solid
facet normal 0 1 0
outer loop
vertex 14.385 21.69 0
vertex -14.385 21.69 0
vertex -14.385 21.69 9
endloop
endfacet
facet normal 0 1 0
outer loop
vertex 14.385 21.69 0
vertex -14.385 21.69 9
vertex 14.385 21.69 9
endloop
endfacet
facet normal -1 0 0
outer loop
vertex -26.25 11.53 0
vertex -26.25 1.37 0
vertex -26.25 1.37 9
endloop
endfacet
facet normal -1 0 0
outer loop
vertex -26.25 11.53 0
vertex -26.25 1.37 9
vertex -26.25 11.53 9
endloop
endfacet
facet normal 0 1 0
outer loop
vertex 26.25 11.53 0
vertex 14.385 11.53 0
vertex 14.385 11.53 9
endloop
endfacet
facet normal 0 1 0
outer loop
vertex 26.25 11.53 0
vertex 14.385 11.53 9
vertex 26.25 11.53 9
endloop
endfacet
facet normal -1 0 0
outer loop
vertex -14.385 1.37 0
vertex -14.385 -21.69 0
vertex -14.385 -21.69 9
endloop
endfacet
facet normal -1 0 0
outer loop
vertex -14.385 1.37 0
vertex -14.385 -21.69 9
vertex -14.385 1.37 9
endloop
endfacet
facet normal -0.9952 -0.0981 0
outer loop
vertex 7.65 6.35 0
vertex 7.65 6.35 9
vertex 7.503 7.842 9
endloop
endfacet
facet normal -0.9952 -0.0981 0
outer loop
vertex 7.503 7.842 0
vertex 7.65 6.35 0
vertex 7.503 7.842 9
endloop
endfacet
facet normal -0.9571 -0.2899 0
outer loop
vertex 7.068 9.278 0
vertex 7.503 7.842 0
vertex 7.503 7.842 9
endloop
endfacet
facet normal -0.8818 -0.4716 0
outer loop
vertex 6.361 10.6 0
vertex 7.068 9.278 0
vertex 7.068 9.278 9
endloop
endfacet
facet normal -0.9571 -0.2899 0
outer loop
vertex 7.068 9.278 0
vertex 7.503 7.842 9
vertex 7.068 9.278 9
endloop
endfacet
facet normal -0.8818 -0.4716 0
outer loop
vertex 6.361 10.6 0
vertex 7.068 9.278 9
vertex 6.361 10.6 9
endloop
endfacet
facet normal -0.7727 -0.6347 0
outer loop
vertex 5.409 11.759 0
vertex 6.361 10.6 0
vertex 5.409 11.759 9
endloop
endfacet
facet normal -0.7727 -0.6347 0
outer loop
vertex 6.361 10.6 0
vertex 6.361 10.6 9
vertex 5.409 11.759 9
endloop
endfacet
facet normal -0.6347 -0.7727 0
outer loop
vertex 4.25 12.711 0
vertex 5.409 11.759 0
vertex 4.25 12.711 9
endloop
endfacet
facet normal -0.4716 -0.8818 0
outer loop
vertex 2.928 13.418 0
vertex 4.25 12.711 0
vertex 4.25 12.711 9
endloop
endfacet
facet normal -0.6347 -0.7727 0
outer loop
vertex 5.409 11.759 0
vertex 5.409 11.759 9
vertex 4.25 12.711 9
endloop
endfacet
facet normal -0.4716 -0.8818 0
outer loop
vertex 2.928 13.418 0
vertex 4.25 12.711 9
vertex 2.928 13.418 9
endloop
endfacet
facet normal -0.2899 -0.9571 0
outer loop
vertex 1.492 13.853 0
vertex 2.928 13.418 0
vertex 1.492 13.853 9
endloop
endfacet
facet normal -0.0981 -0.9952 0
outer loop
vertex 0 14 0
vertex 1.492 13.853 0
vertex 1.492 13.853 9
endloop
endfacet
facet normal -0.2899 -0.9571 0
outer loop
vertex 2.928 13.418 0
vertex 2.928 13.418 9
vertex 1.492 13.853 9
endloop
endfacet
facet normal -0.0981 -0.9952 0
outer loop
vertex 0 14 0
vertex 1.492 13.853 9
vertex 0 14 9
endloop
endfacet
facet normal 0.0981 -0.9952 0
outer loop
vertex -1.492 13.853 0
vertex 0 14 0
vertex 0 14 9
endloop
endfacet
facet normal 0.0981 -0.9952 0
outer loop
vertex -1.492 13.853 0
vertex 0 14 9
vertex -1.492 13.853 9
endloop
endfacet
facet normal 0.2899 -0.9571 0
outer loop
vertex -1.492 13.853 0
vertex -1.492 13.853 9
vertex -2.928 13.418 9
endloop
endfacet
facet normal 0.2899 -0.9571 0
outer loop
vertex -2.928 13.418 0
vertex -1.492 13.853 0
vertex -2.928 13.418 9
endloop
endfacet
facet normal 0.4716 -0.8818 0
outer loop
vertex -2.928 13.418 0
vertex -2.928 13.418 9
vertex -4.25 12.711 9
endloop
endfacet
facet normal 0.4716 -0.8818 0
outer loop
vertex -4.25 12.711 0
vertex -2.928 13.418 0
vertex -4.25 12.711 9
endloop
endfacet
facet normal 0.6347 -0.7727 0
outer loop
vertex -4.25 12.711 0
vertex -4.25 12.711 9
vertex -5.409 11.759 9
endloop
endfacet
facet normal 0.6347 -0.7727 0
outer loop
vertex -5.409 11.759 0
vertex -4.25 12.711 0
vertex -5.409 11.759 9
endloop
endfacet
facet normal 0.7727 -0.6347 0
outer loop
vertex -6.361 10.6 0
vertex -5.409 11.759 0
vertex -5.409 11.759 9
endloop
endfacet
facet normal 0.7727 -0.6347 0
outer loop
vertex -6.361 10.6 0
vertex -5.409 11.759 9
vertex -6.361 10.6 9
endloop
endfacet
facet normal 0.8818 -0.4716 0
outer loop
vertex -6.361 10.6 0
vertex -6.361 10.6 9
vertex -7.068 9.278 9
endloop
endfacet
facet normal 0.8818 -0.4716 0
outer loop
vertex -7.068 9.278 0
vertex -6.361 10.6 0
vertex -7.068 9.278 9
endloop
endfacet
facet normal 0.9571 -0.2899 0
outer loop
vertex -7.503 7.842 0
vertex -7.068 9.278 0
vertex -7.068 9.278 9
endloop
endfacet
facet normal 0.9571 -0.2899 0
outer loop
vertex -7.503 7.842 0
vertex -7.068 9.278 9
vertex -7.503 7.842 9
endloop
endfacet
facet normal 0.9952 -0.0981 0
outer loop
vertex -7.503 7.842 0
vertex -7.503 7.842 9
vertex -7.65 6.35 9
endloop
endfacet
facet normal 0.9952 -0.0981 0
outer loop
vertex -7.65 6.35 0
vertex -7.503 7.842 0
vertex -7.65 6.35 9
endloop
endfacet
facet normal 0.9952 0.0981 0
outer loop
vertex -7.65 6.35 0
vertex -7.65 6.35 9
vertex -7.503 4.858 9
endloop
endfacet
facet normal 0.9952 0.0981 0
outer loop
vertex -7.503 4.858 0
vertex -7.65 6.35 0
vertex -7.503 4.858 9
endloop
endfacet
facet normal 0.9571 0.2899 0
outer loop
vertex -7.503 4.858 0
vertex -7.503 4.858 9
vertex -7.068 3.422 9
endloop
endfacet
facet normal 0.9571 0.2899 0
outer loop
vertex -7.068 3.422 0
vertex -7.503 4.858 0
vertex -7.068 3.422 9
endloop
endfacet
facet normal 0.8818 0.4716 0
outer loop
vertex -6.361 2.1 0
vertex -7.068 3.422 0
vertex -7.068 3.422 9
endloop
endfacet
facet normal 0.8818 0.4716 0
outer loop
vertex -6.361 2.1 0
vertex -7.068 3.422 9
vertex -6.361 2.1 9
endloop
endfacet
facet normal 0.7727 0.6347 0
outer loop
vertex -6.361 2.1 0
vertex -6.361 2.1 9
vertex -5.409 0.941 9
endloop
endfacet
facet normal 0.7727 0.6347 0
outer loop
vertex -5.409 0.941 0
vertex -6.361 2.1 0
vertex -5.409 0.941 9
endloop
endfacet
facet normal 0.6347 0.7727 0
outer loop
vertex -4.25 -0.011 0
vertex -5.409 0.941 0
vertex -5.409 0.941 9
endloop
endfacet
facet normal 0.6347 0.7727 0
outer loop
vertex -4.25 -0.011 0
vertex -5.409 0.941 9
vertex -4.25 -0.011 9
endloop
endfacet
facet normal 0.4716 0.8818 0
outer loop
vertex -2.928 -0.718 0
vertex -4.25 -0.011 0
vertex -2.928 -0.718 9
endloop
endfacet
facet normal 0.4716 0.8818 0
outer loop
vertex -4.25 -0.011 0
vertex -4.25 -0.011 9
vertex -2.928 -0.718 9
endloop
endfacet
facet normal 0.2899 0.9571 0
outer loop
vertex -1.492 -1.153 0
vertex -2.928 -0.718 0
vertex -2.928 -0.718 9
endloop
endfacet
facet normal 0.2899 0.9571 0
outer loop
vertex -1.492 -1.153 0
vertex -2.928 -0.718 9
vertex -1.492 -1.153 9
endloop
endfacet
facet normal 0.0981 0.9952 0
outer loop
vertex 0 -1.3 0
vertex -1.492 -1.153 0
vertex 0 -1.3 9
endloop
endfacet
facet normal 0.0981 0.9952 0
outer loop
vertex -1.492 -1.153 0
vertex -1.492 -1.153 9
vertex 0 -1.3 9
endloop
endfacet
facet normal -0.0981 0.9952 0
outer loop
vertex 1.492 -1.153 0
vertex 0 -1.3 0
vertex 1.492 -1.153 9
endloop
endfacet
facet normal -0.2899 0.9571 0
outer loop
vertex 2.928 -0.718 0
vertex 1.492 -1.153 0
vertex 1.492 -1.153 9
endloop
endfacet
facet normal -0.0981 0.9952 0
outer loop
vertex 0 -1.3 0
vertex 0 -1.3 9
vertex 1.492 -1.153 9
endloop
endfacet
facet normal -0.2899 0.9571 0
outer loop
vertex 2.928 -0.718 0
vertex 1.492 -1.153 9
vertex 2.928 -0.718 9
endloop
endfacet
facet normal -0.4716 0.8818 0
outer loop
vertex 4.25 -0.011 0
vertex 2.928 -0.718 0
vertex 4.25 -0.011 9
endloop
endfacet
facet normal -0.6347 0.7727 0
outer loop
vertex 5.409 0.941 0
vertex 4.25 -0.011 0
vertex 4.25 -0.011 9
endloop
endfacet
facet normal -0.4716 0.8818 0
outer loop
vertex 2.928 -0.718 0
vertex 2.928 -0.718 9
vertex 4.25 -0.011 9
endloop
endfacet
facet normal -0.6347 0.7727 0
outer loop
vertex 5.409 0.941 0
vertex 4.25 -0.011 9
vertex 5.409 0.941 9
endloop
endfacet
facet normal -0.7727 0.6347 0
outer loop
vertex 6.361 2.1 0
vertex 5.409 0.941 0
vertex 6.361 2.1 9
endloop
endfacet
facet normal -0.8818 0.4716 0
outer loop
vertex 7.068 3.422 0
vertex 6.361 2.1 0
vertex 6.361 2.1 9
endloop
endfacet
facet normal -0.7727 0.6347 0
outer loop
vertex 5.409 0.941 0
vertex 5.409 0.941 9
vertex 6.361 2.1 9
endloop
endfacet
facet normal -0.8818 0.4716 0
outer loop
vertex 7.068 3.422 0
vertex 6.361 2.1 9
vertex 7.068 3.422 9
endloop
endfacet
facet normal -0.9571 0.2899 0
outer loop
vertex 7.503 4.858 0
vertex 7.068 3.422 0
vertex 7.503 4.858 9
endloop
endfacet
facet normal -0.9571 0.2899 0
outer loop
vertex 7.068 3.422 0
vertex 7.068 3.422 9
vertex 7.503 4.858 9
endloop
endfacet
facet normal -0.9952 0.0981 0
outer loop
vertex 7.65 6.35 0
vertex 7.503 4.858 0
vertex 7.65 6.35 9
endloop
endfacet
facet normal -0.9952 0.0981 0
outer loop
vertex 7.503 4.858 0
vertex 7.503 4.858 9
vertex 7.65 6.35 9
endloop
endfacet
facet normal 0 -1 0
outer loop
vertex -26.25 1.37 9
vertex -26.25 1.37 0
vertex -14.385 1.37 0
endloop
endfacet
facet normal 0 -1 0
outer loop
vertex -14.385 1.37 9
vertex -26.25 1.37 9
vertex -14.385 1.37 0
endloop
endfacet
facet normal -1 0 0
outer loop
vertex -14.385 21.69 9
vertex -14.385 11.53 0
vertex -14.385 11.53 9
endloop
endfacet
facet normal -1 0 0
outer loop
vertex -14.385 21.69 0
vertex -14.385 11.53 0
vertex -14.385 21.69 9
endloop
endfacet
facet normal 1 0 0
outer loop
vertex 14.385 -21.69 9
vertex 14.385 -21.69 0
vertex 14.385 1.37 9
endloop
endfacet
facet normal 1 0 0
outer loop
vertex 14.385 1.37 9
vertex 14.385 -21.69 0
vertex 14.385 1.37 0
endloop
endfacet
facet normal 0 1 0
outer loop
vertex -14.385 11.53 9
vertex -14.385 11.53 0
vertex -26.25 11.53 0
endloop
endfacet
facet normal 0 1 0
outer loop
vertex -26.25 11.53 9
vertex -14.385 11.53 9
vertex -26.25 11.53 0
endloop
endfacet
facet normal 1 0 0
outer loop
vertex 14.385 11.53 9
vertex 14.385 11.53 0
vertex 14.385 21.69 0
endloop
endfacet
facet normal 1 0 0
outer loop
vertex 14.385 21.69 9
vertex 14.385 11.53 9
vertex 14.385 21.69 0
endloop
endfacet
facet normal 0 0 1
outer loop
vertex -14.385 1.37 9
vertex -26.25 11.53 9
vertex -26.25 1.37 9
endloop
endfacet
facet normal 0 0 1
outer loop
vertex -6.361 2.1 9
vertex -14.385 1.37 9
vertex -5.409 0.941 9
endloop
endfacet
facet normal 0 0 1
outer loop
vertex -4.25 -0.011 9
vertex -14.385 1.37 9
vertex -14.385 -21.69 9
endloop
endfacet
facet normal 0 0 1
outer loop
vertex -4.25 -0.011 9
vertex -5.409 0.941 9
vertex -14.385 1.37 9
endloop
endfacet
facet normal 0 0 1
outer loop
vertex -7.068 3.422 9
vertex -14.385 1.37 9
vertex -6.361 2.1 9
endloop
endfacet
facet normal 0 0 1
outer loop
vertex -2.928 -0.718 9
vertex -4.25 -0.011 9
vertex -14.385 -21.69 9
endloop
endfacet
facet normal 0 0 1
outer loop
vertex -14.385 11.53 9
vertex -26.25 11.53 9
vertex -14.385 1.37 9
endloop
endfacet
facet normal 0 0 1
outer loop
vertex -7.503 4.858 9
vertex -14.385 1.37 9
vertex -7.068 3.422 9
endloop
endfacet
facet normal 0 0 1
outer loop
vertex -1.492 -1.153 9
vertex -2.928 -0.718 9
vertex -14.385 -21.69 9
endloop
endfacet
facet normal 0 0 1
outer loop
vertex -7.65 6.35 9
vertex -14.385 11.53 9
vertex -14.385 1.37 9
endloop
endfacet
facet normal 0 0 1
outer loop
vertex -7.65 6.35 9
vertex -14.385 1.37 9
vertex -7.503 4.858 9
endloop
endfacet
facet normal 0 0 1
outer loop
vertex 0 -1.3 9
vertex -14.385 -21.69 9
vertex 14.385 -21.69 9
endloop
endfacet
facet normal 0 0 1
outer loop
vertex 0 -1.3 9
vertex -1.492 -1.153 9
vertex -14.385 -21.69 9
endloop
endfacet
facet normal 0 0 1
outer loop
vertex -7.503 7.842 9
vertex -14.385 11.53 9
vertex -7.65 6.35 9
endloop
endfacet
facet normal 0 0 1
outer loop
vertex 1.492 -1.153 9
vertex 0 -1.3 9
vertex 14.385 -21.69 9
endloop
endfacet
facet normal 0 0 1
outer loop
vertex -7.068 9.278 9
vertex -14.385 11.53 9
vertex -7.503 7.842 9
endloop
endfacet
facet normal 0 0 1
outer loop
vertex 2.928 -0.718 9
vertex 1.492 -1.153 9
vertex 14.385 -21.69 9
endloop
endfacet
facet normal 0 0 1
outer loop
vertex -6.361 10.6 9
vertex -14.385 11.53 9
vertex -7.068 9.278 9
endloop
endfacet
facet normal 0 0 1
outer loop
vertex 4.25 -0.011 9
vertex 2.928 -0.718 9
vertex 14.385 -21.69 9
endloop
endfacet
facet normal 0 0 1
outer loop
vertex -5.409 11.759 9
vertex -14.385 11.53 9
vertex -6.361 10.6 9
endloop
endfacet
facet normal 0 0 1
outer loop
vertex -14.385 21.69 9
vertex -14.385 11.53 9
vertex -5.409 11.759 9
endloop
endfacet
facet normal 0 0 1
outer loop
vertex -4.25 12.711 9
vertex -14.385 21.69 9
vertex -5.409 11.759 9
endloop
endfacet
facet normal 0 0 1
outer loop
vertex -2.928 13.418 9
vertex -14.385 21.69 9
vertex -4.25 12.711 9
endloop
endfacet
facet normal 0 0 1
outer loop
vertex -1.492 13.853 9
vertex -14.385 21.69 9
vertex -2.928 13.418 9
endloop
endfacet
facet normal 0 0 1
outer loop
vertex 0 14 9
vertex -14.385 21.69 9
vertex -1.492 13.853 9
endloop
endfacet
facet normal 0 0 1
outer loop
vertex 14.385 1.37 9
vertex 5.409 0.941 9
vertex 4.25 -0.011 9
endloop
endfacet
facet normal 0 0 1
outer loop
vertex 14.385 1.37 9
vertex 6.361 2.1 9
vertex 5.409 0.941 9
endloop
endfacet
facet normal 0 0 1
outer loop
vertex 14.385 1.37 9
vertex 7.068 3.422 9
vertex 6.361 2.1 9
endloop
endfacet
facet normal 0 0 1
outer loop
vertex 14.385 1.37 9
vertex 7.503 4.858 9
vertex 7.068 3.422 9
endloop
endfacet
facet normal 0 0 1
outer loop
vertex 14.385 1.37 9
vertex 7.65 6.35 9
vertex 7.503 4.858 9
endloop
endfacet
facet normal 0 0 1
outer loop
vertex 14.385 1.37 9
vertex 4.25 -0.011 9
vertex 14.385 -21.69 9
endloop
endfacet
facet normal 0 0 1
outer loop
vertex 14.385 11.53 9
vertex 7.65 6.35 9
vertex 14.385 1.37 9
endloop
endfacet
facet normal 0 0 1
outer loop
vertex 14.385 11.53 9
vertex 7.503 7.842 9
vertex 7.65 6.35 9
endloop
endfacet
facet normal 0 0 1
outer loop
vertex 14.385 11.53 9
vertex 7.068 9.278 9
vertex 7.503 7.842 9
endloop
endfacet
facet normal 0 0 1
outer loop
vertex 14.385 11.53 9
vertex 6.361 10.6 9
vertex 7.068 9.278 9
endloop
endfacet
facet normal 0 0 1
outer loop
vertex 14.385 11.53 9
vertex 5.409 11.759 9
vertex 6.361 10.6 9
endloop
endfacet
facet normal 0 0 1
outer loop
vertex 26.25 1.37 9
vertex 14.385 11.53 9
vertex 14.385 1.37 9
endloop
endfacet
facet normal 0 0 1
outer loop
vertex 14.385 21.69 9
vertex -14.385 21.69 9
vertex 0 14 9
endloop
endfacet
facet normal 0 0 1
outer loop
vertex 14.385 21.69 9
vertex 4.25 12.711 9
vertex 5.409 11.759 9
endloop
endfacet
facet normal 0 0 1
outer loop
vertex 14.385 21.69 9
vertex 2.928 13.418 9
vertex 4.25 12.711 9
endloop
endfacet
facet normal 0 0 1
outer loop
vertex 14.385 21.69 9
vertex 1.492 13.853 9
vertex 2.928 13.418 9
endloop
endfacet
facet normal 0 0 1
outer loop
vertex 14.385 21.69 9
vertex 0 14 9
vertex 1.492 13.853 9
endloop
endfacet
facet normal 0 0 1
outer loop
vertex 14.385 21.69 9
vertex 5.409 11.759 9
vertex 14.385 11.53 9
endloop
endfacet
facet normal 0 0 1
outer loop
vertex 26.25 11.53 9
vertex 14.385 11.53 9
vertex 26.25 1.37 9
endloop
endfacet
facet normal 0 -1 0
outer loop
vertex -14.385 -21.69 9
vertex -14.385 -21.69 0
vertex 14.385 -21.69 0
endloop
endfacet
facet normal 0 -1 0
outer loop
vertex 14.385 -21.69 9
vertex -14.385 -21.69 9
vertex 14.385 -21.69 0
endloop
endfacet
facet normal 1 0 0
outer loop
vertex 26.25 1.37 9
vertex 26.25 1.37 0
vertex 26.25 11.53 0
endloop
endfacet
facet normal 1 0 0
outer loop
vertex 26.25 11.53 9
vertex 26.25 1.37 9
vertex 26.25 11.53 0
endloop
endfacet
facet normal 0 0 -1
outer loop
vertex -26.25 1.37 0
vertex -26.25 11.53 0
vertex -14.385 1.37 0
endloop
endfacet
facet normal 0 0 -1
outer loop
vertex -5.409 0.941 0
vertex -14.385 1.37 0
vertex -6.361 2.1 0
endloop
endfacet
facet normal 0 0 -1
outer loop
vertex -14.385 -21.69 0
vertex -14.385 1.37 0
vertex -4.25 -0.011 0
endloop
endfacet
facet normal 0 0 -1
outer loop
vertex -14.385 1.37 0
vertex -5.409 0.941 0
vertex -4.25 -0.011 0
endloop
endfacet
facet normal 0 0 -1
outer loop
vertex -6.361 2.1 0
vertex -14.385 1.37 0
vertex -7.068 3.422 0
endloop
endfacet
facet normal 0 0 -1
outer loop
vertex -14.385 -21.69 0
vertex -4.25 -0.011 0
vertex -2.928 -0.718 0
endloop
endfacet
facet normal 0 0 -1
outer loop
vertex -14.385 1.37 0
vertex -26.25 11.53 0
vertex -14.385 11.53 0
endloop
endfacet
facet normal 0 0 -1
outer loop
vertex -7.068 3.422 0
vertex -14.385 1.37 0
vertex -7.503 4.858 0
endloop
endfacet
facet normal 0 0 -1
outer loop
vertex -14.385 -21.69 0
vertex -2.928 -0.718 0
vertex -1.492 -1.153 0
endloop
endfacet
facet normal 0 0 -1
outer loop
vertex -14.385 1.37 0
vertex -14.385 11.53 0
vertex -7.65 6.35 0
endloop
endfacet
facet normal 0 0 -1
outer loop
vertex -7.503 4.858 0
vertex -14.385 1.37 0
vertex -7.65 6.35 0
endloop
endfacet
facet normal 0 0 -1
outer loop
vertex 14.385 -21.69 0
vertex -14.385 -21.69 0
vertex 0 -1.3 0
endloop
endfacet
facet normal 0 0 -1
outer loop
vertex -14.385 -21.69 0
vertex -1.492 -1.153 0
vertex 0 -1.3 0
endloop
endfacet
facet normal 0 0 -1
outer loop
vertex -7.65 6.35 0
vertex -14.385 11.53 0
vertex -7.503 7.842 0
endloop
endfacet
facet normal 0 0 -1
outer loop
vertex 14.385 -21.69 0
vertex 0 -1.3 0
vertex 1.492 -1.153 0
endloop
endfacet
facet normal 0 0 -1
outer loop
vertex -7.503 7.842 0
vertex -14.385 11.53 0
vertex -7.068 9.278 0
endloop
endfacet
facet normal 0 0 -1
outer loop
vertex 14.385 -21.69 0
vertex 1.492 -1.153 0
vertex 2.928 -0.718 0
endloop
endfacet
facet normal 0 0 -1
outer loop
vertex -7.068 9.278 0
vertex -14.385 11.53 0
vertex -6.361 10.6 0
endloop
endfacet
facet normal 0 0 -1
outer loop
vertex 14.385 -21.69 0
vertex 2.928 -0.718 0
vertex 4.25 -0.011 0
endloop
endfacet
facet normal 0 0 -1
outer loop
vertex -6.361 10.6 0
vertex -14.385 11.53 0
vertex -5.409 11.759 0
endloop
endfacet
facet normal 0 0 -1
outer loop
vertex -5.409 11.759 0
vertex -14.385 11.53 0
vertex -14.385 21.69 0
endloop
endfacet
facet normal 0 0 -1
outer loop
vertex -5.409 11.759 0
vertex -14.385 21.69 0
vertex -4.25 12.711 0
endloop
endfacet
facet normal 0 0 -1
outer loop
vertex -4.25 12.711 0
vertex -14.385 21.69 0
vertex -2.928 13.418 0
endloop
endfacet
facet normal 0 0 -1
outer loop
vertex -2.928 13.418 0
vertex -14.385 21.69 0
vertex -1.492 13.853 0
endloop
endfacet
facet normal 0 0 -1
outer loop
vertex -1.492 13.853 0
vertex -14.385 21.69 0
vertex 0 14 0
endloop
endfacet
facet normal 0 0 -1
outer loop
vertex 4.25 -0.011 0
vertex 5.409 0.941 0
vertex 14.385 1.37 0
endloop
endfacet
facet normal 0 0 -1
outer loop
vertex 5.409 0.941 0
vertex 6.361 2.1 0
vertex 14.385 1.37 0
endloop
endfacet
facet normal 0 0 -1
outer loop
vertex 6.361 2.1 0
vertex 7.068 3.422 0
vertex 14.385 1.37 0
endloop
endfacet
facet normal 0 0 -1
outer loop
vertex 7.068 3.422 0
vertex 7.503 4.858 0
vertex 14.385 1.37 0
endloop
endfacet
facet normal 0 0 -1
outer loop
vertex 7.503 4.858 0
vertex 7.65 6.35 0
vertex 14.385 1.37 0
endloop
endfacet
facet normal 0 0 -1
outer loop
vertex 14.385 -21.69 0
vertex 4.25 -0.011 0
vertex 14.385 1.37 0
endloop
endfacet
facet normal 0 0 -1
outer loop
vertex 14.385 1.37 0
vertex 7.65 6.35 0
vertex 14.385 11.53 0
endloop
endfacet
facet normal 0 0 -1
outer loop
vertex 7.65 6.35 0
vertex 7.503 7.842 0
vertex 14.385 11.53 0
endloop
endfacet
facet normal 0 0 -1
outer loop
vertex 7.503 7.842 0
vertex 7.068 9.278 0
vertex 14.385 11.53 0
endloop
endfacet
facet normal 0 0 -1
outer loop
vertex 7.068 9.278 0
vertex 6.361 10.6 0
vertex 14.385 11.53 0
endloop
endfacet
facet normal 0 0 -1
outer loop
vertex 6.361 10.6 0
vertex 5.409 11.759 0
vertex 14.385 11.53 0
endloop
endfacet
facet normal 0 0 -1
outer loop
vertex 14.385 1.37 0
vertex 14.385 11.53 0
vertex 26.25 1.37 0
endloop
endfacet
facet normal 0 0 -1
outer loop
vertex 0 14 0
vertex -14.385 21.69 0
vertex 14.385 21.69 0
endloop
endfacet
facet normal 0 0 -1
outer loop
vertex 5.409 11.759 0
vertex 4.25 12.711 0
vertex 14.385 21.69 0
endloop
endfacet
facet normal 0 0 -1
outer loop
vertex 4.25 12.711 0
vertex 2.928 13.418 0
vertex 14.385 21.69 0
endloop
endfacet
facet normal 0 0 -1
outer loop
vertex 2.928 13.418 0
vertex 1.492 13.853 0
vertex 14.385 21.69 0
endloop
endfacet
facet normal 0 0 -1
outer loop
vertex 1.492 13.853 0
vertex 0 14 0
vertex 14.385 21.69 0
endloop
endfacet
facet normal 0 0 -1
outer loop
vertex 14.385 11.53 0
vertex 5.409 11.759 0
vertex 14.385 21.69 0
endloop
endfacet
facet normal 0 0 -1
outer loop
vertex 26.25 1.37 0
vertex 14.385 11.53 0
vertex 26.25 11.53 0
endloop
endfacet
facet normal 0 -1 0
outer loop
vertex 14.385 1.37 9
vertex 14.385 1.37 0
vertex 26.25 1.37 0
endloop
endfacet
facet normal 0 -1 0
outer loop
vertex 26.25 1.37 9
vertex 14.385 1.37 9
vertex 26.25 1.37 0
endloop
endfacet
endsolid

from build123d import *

# Parameters (mm, degrees)
SKETCH1_W           = 11.865
SKETCH1_H           = 10.16
SKETCH1_W_2         = 28.77
SKETCH1_H_2         = 23.06
BOSS_EXTRUDE1_DEPTH = 9
SKETCH3_R           = 7.65
CUT_EXTRUDE1_DEPTH  = 36.220996579


with BuildPart() as part:
    # Sketch1 → Boss-Extrude1 (new body)
    with BuildSketch(Plane.XY):
        with Locations((-20.3175, 6.45)):
            Rectangle(SKETCH1_W, SKETCH1_H)
        with Locations((0, -10.16)):
            Rectangle(SKETCH1_W_2, SKETCH1_H_2)
        with Locations((0, 6.45)):
            Rectangle(SKETCH1_W_2, SKETCH1_H)
        with Locations((0, 16.61)):
            Rectangle(SKETCH1_W_2, SKETCH1_H)
        with Locations((20.3175, 6.45)):
            Rectangle(SKETCH1_W, SKETCH1_H)
    extrude(amount=BOSS_EXTRUDE1_DEPTH)

    # Sketch3 → Cut-Extrude1 (cut, through all)
    with BuildSketch(Plane.XY.offset(9)):
        with Locations((0, 6.35)):
            Circle(SKETCH3_R)
    extrude(amount=-CUT_EXTRUDE1_DEPTH, mode=Mode.SUBTRACT)


solid = part.part
